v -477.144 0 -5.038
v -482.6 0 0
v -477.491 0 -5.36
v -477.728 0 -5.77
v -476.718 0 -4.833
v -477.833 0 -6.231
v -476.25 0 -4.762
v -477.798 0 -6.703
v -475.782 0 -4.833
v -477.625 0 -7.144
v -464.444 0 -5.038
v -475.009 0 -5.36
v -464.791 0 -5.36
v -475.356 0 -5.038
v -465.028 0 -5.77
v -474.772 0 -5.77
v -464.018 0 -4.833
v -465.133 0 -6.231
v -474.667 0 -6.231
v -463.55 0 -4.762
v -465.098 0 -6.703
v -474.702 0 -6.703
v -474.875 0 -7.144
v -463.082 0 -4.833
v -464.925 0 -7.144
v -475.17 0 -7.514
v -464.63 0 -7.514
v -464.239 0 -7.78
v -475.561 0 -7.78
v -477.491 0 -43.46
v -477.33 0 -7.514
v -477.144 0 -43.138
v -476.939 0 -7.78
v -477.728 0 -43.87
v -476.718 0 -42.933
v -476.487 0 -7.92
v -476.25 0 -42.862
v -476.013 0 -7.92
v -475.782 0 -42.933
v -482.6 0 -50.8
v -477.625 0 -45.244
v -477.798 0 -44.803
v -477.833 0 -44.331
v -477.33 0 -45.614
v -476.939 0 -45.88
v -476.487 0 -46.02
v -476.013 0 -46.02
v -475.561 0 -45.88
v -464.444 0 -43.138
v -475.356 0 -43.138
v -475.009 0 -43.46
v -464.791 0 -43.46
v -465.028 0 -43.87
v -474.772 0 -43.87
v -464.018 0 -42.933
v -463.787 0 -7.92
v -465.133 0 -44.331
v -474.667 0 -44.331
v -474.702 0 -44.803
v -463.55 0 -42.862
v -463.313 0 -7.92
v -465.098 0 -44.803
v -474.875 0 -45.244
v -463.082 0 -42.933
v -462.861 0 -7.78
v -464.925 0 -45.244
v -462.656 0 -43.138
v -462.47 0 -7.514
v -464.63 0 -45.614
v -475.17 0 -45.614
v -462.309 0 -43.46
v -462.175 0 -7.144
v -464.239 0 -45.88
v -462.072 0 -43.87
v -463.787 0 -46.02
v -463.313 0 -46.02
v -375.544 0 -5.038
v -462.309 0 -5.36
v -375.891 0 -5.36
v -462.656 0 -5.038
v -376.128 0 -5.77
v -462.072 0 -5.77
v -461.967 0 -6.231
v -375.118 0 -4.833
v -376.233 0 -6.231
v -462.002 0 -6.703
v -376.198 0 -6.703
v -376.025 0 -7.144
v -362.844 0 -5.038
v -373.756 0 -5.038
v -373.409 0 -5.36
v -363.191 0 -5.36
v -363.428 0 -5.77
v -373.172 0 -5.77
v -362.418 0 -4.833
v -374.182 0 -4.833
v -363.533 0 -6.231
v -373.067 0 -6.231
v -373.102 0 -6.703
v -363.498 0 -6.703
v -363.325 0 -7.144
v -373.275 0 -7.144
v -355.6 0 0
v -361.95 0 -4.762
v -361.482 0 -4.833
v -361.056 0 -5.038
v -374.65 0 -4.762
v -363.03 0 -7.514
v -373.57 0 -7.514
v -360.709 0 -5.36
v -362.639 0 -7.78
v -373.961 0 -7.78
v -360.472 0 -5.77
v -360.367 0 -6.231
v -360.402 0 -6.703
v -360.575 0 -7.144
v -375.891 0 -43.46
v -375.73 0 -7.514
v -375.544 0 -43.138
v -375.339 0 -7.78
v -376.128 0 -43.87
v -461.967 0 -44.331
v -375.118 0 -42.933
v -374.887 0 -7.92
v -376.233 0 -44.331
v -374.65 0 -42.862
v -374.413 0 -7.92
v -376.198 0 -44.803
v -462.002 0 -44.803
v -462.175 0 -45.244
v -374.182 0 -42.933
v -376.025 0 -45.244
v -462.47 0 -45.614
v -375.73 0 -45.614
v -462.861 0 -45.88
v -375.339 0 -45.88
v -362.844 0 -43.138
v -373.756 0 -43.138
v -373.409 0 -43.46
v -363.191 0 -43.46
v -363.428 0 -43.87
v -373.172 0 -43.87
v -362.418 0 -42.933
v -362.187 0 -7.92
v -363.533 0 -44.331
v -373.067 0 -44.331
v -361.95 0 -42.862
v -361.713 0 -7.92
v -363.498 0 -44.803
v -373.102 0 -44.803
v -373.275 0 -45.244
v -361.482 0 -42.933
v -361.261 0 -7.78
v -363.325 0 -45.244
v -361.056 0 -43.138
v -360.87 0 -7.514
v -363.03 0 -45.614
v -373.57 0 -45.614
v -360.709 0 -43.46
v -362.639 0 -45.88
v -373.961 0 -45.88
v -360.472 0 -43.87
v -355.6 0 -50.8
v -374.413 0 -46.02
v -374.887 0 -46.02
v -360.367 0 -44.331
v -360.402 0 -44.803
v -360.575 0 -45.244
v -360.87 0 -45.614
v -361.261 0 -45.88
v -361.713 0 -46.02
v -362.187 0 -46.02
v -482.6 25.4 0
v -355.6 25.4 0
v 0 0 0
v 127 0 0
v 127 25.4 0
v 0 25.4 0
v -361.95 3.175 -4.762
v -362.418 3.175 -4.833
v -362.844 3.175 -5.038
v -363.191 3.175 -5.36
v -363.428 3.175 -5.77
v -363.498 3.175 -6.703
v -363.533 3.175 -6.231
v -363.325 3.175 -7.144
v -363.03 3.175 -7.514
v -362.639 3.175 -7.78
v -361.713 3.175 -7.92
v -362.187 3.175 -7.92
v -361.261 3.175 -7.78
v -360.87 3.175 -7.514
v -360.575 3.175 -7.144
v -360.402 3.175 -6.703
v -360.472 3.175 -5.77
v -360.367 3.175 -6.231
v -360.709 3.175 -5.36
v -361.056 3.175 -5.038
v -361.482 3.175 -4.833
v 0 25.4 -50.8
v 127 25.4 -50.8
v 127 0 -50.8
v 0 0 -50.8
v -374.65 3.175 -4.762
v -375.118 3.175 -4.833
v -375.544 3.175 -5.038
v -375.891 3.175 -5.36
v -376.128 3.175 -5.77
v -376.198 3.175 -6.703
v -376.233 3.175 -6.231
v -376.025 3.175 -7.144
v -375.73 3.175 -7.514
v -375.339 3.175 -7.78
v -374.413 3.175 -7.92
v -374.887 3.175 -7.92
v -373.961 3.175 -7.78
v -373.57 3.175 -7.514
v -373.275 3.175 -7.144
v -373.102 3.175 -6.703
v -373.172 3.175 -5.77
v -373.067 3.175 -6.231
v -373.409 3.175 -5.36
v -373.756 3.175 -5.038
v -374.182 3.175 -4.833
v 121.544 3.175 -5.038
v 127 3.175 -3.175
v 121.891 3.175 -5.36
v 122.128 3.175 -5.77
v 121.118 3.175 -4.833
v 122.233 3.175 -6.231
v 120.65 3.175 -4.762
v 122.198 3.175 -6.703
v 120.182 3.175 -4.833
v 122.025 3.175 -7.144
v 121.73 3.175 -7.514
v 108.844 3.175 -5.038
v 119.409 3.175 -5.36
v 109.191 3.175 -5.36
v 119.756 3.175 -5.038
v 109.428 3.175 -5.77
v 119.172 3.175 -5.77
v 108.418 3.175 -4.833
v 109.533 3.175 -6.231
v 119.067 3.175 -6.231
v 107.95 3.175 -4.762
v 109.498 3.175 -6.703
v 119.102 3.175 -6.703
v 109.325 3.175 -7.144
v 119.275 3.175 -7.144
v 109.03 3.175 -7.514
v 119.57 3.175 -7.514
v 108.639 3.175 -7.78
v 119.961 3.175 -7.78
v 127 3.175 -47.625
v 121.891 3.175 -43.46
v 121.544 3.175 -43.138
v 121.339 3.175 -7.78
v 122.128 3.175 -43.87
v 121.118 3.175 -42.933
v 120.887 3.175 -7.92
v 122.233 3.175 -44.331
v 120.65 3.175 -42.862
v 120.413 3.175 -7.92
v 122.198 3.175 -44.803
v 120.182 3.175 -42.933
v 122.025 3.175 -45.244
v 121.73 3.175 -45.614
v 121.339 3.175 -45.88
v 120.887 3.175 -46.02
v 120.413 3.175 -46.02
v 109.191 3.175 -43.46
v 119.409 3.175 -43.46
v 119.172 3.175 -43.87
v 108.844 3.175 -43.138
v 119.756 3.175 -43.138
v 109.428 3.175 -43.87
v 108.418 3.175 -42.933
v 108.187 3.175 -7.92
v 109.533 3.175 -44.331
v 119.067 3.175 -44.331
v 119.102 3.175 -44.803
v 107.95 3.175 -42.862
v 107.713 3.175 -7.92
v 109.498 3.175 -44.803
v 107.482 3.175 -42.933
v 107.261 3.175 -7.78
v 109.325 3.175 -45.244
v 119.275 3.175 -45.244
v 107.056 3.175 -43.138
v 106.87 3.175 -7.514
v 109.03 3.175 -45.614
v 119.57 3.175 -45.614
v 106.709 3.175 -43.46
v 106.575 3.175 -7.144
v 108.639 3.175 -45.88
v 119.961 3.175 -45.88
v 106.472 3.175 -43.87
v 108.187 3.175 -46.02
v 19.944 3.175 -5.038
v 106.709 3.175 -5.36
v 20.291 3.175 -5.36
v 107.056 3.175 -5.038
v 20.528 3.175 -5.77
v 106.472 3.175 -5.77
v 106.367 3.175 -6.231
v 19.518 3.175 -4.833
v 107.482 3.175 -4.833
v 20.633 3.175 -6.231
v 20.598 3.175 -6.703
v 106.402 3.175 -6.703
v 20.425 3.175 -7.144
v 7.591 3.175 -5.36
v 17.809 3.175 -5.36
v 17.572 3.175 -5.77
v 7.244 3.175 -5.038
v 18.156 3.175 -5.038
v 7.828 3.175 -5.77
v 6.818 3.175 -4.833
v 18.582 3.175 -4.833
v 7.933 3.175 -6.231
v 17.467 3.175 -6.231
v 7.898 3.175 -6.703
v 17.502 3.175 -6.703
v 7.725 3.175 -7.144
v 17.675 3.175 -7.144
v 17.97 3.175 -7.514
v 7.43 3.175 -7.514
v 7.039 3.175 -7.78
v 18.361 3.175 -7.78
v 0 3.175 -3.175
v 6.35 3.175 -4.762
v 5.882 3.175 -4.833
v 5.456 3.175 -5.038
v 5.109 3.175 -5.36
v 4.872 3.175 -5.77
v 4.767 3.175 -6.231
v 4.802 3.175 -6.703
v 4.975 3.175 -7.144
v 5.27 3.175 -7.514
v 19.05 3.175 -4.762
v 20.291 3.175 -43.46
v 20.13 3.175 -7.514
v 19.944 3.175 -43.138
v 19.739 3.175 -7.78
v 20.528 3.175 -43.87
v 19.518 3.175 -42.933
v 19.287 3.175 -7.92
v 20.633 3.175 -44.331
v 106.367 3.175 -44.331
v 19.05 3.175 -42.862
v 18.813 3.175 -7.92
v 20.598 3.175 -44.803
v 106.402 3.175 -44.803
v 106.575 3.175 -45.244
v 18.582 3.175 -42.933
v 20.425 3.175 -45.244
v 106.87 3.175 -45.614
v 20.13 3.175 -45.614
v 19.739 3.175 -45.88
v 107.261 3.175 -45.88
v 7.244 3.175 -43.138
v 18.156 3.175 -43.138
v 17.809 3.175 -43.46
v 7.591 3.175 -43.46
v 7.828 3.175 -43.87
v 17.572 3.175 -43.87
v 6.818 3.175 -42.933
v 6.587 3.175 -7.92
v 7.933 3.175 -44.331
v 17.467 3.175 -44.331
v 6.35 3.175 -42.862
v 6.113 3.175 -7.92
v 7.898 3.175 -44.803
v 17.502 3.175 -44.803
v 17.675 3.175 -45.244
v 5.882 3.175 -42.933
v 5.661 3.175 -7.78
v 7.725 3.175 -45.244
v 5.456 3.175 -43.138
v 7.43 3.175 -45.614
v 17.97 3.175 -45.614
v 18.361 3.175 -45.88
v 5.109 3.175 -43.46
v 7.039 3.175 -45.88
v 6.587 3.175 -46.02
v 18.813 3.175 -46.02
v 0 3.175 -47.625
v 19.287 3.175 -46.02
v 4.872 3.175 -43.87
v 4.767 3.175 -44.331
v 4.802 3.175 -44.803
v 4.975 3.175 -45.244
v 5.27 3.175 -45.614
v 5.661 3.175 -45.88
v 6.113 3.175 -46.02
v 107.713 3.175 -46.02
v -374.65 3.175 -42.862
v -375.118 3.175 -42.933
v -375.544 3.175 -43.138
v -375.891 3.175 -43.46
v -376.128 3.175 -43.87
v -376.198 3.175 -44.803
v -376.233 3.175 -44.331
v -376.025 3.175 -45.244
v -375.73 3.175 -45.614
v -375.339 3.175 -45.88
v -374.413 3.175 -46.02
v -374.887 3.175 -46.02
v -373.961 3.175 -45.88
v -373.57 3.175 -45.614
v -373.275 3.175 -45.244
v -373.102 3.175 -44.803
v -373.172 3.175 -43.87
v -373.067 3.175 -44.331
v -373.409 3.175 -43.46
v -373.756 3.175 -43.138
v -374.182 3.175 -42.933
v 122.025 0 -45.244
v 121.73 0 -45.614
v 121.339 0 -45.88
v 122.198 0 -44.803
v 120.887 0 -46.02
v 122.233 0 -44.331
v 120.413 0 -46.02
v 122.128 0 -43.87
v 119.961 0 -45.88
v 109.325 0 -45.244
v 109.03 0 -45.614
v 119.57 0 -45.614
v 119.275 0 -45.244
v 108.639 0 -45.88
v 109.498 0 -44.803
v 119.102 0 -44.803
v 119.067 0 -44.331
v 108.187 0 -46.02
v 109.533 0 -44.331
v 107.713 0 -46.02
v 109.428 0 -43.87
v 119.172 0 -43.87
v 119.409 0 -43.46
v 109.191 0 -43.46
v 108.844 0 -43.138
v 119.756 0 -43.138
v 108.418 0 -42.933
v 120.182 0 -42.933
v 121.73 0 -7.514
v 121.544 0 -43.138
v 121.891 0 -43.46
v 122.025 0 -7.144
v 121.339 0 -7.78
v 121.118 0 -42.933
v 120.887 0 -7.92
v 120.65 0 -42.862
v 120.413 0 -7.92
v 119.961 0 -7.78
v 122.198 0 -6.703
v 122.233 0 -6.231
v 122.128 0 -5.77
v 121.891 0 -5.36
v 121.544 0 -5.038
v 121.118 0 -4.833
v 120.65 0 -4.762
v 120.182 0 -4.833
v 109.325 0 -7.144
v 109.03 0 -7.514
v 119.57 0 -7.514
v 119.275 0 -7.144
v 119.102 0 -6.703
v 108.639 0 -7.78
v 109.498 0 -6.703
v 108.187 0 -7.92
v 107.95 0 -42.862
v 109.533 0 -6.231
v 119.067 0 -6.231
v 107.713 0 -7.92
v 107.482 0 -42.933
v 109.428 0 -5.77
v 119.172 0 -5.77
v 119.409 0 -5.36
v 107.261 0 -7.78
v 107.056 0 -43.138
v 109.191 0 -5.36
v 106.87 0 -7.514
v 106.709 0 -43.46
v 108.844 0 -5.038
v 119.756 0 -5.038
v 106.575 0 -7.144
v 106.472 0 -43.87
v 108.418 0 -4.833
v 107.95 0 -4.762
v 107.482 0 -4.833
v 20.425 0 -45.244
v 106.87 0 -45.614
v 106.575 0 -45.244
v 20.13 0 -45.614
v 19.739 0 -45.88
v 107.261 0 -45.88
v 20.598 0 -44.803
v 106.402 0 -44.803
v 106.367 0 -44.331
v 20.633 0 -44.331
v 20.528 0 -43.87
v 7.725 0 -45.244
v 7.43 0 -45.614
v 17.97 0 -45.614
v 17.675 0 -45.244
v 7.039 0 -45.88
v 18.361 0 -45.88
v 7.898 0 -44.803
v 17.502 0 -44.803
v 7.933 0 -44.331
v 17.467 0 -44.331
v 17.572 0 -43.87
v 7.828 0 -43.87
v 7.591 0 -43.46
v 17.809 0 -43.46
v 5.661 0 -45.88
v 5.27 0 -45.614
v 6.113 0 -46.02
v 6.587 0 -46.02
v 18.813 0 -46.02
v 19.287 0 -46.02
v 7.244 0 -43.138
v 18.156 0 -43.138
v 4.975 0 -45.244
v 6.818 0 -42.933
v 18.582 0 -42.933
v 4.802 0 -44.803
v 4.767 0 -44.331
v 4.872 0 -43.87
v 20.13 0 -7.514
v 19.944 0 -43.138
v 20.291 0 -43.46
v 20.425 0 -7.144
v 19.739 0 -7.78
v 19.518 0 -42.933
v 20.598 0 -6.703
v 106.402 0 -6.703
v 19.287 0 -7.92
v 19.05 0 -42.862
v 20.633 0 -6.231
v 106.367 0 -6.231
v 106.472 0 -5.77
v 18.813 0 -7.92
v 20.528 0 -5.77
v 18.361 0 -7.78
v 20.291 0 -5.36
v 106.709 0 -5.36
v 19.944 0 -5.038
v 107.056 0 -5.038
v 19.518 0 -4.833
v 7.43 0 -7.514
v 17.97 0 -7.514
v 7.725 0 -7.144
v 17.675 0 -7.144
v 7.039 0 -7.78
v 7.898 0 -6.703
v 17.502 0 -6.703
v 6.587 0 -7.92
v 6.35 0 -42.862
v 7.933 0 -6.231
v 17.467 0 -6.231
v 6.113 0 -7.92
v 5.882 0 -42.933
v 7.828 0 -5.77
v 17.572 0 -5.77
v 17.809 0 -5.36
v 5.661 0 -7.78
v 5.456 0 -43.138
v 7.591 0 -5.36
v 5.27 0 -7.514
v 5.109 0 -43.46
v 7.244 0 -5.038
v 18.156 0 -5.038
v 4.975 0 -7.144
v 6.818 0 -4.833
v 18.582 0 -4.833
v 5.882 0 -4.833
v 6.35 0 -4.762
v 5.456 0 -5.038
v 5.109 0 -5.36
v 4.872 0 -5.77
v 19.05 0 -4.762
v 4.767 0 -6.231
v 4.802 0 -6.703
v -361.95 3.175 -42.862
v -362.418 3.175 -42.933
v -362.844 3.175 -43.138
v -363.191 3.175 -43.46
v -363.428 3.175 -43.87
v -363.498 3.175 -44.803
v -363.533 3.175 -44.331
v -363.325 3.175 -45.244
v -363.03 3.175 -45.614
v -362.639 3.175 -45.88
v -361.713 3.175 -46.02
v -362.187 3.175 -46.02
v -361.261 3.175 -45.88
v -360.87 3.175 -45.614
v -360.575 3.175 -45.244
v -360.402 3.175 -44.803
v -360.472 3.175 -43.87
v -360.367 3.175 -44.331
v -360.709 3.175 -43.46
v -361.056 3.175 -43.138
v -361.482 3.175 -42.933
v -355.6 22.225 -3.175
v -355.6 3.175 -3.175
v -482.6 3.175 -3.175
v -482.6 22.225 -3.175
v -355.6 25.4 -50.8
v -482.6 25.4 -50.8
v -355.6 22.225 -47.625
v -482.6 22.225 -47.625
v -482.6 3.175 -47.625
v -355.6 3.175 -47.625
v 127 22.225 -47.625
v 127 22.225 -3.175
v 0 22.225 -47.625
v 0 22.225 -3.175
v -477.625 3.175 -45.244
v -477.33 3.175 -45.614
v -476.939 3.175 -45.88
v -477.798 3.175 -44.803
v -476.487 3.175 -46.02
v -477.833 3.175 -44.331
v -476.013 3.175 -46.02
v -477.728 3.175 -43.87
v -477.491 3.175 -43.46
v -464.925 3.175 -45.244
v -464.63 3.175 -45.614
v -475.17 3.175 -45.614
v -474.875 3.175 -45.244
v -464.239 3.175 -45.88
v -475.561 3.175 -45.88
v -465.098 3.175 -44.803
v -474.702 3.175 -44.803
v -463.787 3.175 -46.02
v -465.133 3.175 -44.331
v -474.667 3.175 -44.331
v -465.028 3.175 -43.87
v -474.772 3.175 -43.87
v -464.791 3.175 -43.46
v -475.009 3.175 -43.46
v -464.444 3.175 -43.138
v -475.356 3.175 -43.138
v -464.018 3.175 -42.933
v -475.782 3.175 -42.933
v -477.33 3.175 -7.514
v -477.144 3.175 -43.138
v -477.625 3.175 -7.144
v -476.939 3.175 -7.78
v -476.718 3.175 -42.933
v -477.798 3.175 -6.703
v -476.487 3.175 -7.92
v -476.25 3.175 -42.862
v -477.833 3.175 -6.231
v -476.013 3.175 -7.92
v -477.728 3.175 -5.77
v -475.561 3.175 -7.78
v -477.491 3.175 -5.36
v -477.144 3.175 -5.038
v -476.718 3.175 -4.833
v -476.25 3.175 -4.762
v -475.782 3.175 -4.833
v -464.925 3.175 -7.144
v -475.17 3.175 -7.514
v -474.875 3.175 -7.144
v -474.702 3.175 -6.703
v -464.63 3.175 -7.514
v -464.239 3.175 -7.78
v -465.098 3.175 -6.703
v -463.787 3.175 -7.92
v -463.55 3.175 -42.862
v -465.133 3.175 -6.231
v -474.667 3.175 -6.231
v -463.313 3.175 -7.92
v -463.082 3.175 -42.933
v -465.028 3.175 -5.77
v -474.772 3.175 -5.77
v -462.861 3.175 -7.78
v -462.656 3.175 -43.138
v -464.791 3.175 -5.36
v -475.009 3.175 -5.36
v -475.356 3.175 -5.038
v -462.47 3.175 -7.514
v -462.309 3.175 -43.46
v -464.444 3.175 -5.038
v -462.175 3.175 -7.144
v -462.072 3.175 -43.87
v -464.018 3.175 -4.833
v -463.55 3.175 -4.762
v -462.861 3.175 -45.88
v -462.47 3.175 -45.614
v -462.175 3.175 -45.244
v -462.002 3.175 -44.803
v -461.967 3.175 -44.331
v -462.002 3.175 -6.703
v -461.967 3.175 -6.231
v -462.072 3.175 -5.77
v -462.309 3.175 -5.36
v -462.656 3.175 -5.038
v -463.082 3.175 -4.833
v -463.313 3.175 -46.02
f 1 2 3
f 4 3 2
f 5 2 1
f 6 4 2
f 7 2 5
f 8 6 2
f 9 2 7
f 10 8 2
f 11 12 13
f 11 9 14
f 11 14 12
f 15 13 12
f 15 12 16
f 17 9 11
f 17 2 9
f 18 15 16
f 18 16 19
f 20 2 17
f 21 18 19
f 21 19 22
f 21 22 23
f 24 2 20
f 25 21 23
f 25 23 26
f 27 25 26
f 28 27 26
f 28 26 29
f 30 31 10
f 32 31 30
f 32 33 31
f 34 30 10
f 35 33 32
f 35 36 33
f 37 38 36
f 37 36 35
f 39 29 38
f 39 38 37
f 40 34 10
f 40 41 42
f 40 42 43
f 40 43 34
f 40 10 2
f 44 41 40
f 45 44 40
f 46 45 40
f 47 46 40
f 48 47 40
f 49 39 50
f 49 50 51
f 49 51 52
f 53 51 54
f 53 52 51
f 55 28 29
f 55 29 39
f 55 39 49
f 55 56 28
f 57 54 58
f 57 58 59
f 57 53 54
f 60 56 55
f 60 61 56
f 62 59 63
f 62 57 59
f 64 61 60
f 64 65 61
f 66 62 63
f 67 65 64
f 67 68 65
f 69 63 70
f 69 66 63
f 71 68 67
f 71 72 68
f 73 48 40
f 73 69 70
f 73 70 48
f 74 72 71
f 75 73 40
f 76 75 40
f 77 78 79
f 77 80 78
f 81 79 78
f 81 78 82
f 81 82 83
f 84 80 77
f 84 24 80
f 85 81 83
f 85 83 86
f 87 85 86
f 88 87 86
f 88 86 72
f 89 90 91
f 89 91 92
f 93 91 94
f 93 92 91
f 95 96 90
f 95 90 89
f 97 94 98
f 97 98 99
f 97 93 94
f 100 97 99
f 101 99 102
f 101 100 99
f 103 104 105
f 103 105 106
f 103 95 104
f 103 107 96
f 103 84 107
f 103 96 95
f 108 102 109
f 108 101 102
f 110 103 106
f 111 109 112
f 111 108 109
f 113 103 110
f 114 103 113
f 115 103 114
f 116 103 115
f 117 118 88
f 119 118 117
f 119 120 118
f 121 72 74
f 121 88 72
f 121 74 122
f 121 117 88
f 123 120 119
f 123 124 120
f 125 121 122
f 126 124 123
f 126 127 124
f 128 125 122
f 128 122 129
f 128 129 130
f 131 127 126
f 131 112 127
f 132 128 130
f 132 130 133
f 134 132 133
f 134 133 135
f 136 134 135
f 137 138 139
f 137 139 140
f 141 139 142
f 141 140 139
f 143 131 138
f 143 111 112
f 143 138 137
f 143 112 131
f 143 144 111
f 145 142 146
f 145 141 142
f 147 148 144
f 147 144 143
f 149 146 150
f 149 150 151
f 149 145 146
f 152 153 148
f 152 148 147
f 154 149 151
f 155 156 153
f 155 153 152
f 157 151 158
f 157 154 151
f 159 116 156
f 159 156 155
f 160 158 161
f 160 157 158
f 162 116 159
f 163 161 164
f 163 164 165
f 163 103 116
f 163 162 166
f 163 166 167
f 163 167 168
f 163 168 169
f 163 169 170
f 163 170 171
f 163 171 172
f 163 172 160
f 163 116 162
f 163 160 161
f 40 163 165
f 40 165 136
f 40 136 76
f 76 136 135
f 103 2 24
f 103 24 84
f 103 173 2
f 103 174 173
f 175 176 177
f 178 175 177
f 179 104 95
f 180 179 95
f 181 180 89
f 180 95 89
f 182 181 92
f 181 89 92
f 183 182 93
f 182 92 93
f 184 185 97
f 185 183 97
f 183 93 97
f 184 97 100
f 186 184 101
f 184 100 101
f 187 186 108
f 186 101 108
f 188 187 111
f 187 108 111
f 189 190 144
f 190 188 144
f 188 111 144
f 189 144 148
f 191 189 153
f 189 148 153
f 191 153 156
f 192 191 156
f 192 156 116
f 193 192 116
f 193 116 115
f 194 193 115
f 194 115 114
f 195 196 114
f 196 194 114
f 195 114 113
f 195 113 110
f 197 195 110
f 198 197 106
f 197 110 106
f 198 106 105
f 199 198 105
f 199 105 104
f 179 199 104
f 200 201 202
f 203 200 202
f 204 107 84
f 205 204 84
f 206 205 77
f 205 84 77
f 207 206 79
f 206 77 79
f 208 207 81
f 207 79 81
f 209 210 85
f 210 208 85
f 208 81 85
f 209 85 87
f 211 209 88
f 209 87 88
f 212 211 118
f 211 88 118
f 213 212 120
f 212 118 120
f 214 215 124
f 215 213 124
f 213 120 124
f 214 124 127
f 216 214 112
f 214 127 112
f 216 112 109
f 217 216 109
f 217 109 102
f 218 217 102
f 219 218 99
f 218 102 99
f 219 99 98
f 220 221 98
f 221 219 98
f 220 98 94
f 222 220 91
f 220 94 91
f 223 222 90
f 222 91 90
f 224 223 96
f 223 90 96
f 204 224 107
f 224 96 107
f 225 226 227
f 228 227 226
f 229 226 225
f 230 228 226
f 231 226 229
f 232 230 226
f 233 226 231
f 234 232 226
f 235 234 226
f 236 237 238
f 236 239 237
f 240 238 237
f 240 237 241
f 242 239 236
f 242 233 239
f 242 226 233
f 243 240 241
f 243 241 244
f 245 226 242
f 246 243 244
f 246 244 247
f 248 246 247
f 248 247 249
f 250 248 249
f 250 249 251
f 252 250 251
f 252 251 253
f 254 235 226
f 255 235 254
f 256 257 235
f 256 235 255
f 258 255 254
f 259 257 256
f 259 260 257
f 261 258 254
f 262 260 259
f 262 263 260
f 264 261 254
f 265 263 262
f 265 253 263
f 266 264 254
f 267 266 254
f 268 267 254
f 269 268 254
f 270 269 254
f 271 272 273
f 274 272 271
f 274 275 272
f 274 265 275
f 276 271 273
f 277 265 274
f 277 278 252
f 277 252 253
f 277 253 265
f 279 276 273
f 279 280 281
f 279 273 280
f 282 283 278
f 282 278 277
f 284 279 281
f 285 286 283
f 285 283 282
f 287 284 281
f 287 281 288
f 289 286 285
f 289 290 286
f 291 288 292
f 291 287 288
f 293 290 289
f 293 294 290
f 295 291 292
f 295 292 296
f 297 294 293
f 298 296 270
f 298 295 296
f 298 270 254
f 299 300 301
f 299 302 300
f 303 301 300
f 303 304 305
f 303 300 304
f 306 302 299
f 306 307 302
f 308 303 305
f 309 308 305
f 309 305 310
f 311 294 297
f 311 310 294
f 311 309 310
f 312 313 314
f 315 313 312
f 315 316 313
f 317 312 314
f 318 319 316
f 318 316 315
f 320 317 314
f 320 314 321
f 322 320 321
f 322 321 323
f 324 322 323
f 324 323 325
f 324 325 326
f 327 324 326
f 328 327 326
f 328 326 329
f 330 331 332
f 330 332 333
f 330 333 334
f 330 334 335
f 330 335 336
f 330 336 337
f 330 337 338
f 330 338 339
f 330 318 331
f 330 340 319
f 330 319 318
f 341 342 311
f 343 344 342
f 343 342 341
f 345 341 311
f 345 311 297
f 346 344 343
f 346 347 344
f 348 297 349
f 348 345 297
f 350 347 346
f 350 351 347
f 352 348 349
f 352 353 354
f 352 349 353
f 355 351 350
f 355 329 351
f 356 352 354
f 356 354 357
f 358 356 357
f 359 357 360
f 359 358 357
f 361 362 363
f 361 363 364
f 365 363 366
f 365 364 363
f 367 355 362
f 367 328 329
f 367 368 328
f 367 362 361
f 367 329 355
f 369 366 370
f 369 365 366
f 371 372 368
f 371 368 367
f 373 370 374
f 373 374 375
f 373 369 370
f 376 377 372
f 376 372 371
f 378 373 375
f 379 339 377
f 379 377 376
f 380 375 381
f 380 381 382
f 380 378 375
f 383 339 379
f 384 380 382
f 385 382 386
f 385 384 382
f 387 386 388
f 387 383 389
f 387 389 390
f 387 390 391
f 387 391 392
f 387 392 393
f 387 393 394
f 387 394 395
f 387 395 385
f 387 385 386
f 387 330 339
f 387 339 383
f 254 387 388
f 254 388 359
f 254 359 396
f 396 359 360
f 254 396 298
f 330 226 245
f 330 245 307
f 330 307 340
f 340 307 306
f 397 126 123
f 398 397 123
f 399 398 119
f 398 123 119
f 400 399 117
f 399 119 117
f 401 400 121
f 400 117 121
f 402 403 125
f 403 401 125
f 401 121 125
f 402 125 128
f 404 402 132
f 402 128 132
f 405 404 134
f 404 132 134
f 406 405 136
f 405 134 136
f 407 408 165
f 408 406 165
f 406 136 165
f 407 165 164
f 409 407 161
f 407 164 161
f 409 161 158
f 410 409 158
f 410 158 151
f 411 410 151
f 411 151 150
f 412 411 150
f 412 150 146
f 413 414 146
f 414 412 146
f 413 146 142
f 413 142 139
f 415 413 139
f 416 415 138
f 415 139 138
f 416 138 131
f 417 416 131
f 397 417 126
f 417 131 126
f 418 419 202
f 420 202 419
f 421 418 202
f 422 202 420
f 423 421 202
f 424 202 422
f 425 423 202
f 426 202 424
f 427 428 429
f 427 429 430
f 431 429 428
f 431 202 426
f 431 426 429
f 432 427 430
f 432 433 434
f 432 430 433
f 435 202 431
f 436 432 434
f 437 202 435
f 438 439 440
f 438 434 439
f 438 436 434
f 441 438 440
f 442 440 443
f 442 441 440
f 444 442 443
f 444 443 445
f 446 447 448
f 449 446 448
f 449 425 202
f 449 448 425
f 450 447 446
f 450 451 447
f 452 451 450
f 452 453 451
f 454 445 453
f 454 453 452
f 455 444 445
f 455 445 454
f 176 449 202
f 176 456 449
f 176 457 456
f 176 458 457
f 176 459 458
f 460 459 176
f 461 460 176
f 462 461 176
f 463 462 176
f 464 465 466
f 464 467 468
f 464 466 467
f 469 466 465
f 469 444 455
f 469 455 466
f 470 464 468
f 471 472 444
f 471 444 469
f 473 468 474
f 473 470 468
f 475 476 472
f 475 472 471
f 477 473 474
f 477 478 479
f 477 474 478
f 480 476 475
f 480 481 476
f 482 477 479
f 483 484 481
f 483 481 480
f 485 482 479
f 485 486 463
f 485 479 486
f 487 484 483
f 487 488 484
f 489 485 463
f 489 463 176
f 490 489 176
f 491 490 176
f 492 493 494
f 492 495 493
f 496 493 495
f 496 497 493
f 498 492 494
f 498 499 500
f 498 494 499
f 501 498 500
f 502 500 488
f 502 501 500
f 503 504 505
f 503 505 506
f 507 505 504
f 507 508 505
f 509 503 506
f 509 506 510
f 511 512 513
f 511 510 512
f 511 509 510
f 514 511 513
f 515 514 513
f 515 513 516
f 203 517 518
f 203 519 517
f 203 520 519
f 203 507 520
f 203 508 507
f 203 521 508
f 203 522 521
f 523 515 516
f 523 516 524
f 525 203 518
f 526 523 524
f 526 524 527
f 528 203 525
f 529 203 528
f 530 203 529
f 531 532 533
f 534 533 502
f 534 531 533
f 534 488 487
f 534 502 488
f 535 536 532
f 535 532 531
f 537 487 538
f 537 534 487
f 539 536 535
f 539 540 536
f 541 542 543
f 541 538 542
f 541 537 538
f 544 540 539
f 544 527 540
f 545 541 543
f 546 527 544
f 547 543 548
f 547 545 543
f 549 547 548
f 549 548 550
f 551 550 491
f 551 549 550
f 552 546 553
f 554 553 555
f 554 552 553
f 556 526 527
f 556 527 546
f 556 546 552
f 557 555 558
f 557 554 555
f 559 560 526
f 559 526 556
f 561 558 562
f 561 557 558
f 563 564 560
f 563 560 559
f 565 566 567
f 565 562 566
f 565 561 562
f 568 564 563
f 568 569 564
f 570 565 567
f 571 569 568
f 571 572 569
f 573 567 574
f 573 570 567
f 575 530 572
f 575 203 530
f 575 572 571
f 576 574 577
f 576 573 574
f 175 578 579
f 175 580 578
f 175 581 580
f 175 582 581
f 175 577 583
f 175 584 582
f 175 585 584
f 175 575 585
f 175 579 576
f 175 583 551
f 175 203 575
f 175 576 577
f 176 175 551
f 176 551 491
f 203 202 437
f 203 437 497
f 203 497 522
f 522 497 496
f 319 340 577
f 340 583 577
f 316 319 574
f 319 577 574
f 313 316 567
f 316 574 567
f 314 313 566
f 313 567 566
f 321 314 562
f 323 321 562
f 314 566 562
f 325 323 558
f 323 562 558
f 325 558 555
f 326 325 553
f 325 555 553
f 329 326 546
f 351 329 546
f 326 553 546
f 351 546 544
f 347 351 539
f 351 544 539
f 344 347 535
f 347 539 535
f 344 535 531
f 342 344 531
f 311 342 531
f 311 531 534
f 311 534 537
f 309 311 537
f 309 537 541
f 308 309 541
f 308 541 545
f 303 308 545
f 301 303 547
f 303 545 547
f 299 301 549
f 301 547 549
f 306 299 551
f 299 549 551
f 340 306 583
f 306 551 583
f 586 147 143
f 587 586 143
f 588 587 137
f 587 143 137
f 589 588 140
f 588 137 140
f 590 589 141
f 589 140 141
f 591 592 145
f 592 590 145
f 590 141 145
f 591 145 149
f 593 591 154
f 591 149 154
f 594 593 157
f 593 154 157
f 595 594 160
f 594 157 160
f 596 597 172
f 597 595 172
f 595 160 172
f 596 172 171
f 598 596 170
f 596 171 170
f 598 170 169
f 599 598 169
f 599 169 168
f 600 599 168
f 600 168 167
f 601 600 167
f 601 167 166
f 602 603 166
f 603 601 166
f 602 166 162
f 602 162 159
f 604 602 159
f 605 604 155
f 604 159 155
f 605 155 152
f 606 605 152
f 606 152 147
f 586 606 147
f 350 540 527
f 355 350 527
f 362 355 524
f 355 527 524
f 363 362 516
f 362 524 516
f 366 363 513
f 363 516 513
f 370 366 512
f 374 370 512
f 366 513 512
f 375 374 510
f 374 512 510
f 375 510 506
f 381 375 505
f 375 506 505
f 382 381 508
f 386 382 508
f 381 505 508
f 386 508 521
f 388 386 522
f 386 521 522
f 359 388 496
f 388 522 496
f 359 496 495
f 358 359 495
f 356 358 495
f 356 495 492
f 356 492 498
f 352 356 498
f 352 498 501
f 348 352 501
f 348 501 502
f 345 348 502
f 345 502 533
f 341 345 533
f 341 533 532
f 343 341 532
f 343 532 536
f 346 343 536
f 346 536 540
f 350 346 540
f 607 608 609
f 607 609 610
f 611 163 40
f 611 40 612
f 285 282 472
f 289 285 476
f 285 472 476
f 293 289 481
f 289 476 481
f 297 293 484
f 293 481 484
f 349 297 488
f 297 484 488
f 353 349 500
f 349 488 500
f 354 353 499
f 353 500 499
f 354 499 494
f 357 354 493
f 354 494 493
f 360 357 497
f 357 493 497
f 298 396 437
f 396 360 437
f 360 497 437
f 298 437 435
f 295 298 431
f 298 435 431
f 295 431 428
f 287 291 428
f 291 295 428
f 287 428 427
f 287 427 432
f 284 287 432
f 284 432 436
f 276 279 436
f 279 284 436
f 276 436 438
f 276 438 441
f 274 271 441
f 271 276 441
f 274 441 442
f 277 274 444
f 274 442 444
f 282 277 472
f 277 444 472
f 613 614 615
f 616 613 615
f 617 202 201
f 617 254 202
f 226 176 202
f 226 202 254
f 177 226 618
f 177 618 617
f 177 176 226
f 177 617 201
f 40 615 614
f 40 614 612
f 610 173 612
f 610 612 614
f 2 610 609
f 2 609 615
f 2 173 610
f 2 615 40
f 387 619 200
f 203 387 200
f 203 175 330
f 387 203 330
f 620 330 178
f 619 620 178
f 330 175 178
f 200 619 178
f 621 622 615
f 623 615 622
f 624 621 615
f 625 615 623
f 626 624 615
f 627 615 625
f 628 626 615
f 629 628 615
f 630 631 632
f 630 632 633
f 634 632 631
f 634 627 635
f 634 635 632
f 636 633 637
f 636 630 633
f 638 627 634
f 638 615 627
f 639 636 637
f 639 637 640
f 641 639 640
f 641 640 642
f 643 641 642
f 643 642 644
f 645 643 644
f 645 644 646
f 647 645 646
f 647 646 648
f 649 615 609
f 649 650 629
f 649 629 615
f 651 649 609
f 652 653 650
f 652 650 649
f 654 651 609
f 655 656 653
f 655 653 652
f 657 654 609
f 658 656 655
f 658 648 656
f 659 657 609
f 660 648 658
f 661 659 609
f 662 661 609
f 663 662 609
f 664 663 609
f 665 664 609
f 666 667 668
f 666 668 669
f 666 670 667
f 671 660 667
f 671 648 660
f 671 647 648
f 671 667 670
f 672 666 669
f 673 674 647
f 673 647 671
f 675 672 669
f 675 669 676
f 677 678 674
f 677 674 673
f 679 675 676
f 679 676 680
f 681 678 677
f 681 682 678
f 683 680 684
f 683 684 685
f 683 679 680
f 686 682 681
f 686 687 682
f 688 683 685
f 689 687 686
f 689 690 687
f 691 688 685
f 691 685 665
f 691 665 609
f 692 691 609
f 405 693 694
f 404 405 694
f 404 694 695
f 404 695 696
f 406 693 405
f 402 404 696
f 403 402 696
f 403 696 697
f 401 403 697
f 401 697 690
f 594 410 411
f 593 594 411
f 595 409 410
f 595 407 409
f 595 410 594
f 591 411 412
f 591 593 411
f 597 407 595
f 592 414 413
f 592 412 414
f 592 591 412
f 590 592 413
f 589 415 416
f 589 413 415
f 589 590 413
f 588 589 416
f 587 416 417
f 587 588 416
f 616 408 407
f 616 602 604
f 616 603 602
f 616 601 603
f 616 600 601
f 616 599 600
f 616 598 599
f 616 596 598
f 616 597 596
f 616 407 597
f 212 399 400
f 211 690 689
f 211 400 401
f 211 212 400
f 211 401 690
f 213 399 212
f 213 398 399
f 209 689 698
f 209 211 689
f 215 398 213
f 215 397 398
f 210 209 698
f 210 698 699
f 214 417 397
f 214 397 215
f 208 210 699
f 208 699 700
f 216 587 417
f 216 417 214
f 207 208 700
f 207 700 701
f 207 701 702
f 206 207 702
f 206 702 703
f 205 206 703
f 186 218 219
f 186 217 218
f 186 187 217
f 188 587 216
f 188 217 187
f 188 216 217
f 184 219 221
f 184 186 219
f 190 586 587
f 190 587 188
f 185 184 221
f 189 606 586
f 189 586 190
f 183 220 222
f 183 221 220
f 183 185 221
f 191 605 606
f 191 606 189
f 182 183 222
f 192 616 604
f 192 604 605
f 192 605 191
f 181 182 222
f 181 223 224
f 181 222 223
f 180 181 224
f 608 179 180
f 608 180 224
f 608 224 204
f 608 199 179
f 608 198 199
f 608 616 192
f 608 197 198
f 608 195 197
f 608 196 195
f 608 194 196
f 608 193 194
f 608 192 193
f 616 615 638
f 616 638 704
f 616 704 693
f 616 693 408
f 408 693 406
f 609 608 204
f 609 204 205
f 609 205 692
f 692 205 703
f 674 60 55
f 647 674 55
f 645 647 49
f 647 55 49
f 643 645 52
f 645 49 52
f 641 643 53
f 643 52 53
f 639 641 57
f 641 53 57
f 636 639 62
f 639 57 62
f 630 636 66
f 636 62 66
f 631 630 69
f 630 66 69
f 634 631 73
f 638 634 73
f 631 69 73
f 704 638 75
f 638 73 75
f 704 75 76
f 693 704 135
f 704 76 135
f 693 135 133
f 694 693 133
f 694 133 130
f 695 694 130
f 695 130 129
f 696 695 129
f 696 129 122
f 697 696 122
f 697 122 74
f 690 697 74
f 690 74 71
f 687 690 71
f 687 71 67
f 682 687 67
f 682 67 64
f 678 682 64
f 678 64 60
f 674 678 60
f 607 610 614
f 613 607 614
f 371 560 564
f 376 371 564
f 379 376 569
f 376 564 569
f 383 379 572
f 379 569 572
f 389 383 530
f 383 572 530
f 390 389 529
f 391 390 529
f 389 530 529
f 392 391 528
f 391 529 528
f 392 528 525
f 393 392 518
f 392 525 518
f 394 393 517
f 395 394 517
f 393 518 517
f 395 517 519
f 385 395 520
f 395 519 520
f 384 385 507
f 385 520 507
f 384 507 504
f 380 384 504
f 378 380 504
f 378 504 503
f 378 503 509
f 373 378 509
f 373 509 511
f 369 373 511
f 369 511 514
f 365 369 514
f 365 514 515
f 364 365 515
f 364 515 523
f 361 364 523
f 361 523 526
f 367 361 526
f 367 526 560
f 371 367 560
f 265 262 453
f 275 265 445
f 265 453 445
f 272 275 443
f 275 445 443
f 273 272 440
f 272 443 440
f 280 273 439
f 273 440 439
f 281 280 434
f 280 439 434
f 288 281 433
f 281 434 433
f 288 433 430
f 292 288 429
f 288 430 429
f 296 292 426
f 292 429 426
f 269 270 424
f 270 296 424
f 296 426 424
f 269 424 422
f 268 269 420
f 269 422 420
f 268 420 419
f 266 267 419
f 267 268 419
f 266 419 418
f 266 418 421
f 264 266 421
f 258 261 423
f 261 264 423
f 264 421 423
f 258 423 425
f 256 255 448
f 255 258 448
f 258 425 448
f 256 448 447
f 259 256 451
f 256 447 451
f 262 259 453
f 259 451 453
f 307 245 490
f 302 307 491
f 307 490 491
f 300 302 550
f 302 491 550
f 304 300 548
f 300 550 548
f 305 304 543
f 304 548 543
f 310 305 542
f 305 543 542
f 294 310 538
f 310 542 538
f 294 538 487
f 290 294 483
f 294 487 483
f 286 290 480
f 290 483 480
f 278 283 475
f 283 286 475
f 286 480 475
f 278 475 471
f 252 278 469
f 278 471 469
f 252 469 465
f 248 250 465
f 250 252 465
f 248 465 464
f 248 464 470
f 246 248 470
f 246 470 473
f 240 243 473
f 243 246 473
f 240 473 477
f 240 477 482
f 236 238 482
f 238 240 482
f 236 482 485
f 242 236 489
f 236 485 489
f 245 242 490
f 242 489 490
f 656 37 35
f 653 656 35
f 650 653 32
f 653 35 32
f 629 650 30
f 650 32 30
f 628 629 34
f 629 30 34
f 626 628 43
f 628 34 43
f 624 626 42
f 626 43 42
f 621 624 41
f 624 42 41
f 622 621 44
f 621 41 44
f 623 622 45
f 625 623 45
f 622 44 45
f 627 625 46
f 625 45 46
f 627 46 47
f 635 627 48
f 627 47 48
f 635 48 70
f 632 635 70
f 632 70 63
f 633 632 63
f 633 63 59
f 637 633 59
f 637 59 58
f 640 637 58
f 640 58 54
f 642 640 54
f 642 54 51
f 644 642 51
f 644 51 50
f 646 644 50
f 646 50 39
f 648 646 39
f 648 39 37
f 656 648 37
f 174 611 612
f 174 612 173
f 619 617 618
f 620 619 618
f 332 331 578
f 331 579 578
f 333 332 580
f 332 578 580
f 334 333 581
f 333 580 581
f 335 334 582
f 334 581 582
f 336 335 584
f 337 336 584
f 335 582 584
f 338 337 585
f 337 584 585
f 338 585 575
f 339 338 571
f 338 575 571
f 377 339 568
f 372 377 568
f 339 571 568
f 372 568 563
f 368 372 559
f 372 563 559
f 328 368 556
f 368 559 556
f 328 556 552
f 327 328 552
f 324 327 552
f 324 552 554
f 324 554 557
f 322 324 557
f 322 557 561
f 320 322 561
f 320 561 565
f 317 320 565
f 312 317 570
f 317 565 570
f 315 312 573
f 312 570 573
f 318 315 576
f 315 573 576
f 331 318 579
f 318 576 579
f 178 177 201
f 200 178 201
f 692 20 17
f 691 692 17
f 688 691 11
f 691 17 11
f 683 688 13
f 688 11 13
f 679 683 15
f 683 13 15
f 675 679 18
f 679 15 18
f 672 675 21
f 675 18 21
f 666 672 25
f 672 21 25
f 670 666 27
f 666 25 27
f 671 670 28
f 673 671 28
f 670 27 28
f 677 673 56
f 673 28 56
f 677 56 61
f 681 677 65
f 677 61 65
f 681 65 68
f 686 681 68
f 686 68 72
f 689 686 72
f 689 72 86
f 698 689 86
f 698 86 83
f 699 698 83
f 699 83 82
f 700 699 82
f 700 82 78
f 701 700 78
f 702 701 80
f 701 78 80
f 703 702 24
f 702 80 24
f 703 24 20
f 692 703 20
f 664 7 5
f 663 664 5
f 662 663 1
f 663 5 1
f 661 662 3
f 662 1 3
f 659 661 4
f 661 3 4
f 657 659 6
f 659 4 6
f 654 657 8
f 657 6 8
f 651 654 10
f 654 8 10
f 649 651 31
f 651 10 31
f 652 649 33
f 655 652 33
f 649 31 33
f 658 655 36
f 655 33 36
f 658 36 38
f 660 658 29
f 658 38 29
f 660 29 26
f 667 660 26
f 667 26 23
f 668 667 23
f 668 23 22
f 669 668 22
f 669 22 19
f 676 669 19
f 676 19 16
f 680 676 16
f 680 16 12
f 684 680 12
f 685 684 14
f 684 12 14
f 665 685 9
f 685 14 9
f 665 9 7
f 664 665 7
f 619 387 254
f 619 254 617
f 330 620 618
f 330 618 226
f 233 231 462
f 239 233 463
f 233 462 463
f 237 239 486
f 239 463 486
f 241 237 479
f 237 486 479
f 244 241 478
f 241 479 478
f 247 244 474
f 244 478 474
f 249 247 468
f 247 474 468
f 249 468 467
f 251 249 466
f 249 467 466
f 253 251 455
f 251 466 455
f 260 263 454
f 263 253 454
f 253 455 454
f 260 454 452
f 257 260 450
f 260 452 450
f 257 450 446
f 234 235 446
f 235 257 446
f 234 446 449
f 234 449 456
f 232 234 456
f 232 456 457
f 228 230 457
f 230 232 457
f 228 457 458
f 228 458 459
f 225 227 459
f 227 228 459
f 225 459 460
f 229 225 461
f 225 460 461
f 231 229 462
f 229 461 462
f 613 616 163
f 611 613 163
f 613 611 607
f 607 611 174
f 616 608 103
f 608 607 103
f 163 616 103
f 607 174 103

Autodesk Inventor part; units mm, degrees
ref_plane "YZ Plane" through (0, 0, 0) normal (1, 0, 0) x (0, 1, 0)
sketch "Sketch1" plane through (0, 0, 0) normal (1, 0, 0) x (0, 1, 0)
  line L0 (0, 0) -> (25.4, 0)
  line L1 (25.4, 0) -> (25.4, -50.8)
  line L2 (25.4, -50.8) -> (0, -50.8)
  line L3 (0, -50.8) -> (0, 0)
  line L4 (22.225, -3.175) -> (3.175, -3.175)
  line L5 (3.175, -3.175) -> (3.175, -47.625)
  line L6 (3.175, -47.625) -> (22.225, -47.625)
  line L7 (22.225, -47.625) -> (22.225, -3.175)
  dimension "d0" = 25.4
  dimension "d1" = 50.8
  dimension "d2" = 3.175
  dimension "d3" = 3.175
  dimension "d4" = 3.175
  dimension "d5" = 3.175
extrude "Extrusion1" add sketch "Sketch1" along normal blind 127
sketch "Sketch2" plane through (0, 25.4, 0) normal (0, 1, 0) x (1, 0, 0)
  line L0 (6.35, 6.35) -> (19.05, 6.35)
  line L1 (19.05, 6.35) -> (19.05, 44.45)
  line L2 (19.05, 44.45) -> (6.35, 44.45)
  line L3 (6.35, 44.45) -> (6.35, 6.35)
  line L4 (0, 50.8) -> (0, 0) projected
  line L5 (0, 0) -> (127, 0) projected
  dimension "d8" = 12.7
  dimension "d9" = 38.1
  dimension "d10" = 6.35
  dimension "d11" = 6.35
sketch "Sketch3" plane through (0, 3.175, -3.175) normal (0, 1, 0) x (1, 0, 0)
  line L0 (0, 47.625) -> (127, 47.625) projected
  line L1 (19.05, 41.275) -> (6.35, 41.275) projected
  line L2 (19.05, 3.175) -> (19.05, 41.275) projected
  line L3 (6.35, 41.275) -> (6.35, 3.175) projected
  line L4 (6.35, 3.175) -> (19.05, 3.175) projected
  point P0 (0, -3.175)
hole "Hole1" at (19.05, 3.175, -44.45) at (6.35, 3.175, -44.45) at (19.05, 3.175, -6.35) at (6.35, 3.175, -6.35) direction (0, -1, 0) diameter 3.175 end through all
ref_plane "Work Plane1" through (63.5, 0, 0) normal (-1, 0, 0) x (0, 0, 1)
mirror "Mirror1" about plane through (63.5, 0, 0) normal (-1, 0, 0) of "Hole1"
ref_plane "Work Plane2" through (-177.8, 0, 0) normal (-1, 0, 0) x (0, 0, 1)
mirror "Mirror2" about plane through (-177.8, 0, 0) normal (-1, 0, 0)
properties part number "Intake - 2 by 1 Aluminum Mounting CrossBar"
